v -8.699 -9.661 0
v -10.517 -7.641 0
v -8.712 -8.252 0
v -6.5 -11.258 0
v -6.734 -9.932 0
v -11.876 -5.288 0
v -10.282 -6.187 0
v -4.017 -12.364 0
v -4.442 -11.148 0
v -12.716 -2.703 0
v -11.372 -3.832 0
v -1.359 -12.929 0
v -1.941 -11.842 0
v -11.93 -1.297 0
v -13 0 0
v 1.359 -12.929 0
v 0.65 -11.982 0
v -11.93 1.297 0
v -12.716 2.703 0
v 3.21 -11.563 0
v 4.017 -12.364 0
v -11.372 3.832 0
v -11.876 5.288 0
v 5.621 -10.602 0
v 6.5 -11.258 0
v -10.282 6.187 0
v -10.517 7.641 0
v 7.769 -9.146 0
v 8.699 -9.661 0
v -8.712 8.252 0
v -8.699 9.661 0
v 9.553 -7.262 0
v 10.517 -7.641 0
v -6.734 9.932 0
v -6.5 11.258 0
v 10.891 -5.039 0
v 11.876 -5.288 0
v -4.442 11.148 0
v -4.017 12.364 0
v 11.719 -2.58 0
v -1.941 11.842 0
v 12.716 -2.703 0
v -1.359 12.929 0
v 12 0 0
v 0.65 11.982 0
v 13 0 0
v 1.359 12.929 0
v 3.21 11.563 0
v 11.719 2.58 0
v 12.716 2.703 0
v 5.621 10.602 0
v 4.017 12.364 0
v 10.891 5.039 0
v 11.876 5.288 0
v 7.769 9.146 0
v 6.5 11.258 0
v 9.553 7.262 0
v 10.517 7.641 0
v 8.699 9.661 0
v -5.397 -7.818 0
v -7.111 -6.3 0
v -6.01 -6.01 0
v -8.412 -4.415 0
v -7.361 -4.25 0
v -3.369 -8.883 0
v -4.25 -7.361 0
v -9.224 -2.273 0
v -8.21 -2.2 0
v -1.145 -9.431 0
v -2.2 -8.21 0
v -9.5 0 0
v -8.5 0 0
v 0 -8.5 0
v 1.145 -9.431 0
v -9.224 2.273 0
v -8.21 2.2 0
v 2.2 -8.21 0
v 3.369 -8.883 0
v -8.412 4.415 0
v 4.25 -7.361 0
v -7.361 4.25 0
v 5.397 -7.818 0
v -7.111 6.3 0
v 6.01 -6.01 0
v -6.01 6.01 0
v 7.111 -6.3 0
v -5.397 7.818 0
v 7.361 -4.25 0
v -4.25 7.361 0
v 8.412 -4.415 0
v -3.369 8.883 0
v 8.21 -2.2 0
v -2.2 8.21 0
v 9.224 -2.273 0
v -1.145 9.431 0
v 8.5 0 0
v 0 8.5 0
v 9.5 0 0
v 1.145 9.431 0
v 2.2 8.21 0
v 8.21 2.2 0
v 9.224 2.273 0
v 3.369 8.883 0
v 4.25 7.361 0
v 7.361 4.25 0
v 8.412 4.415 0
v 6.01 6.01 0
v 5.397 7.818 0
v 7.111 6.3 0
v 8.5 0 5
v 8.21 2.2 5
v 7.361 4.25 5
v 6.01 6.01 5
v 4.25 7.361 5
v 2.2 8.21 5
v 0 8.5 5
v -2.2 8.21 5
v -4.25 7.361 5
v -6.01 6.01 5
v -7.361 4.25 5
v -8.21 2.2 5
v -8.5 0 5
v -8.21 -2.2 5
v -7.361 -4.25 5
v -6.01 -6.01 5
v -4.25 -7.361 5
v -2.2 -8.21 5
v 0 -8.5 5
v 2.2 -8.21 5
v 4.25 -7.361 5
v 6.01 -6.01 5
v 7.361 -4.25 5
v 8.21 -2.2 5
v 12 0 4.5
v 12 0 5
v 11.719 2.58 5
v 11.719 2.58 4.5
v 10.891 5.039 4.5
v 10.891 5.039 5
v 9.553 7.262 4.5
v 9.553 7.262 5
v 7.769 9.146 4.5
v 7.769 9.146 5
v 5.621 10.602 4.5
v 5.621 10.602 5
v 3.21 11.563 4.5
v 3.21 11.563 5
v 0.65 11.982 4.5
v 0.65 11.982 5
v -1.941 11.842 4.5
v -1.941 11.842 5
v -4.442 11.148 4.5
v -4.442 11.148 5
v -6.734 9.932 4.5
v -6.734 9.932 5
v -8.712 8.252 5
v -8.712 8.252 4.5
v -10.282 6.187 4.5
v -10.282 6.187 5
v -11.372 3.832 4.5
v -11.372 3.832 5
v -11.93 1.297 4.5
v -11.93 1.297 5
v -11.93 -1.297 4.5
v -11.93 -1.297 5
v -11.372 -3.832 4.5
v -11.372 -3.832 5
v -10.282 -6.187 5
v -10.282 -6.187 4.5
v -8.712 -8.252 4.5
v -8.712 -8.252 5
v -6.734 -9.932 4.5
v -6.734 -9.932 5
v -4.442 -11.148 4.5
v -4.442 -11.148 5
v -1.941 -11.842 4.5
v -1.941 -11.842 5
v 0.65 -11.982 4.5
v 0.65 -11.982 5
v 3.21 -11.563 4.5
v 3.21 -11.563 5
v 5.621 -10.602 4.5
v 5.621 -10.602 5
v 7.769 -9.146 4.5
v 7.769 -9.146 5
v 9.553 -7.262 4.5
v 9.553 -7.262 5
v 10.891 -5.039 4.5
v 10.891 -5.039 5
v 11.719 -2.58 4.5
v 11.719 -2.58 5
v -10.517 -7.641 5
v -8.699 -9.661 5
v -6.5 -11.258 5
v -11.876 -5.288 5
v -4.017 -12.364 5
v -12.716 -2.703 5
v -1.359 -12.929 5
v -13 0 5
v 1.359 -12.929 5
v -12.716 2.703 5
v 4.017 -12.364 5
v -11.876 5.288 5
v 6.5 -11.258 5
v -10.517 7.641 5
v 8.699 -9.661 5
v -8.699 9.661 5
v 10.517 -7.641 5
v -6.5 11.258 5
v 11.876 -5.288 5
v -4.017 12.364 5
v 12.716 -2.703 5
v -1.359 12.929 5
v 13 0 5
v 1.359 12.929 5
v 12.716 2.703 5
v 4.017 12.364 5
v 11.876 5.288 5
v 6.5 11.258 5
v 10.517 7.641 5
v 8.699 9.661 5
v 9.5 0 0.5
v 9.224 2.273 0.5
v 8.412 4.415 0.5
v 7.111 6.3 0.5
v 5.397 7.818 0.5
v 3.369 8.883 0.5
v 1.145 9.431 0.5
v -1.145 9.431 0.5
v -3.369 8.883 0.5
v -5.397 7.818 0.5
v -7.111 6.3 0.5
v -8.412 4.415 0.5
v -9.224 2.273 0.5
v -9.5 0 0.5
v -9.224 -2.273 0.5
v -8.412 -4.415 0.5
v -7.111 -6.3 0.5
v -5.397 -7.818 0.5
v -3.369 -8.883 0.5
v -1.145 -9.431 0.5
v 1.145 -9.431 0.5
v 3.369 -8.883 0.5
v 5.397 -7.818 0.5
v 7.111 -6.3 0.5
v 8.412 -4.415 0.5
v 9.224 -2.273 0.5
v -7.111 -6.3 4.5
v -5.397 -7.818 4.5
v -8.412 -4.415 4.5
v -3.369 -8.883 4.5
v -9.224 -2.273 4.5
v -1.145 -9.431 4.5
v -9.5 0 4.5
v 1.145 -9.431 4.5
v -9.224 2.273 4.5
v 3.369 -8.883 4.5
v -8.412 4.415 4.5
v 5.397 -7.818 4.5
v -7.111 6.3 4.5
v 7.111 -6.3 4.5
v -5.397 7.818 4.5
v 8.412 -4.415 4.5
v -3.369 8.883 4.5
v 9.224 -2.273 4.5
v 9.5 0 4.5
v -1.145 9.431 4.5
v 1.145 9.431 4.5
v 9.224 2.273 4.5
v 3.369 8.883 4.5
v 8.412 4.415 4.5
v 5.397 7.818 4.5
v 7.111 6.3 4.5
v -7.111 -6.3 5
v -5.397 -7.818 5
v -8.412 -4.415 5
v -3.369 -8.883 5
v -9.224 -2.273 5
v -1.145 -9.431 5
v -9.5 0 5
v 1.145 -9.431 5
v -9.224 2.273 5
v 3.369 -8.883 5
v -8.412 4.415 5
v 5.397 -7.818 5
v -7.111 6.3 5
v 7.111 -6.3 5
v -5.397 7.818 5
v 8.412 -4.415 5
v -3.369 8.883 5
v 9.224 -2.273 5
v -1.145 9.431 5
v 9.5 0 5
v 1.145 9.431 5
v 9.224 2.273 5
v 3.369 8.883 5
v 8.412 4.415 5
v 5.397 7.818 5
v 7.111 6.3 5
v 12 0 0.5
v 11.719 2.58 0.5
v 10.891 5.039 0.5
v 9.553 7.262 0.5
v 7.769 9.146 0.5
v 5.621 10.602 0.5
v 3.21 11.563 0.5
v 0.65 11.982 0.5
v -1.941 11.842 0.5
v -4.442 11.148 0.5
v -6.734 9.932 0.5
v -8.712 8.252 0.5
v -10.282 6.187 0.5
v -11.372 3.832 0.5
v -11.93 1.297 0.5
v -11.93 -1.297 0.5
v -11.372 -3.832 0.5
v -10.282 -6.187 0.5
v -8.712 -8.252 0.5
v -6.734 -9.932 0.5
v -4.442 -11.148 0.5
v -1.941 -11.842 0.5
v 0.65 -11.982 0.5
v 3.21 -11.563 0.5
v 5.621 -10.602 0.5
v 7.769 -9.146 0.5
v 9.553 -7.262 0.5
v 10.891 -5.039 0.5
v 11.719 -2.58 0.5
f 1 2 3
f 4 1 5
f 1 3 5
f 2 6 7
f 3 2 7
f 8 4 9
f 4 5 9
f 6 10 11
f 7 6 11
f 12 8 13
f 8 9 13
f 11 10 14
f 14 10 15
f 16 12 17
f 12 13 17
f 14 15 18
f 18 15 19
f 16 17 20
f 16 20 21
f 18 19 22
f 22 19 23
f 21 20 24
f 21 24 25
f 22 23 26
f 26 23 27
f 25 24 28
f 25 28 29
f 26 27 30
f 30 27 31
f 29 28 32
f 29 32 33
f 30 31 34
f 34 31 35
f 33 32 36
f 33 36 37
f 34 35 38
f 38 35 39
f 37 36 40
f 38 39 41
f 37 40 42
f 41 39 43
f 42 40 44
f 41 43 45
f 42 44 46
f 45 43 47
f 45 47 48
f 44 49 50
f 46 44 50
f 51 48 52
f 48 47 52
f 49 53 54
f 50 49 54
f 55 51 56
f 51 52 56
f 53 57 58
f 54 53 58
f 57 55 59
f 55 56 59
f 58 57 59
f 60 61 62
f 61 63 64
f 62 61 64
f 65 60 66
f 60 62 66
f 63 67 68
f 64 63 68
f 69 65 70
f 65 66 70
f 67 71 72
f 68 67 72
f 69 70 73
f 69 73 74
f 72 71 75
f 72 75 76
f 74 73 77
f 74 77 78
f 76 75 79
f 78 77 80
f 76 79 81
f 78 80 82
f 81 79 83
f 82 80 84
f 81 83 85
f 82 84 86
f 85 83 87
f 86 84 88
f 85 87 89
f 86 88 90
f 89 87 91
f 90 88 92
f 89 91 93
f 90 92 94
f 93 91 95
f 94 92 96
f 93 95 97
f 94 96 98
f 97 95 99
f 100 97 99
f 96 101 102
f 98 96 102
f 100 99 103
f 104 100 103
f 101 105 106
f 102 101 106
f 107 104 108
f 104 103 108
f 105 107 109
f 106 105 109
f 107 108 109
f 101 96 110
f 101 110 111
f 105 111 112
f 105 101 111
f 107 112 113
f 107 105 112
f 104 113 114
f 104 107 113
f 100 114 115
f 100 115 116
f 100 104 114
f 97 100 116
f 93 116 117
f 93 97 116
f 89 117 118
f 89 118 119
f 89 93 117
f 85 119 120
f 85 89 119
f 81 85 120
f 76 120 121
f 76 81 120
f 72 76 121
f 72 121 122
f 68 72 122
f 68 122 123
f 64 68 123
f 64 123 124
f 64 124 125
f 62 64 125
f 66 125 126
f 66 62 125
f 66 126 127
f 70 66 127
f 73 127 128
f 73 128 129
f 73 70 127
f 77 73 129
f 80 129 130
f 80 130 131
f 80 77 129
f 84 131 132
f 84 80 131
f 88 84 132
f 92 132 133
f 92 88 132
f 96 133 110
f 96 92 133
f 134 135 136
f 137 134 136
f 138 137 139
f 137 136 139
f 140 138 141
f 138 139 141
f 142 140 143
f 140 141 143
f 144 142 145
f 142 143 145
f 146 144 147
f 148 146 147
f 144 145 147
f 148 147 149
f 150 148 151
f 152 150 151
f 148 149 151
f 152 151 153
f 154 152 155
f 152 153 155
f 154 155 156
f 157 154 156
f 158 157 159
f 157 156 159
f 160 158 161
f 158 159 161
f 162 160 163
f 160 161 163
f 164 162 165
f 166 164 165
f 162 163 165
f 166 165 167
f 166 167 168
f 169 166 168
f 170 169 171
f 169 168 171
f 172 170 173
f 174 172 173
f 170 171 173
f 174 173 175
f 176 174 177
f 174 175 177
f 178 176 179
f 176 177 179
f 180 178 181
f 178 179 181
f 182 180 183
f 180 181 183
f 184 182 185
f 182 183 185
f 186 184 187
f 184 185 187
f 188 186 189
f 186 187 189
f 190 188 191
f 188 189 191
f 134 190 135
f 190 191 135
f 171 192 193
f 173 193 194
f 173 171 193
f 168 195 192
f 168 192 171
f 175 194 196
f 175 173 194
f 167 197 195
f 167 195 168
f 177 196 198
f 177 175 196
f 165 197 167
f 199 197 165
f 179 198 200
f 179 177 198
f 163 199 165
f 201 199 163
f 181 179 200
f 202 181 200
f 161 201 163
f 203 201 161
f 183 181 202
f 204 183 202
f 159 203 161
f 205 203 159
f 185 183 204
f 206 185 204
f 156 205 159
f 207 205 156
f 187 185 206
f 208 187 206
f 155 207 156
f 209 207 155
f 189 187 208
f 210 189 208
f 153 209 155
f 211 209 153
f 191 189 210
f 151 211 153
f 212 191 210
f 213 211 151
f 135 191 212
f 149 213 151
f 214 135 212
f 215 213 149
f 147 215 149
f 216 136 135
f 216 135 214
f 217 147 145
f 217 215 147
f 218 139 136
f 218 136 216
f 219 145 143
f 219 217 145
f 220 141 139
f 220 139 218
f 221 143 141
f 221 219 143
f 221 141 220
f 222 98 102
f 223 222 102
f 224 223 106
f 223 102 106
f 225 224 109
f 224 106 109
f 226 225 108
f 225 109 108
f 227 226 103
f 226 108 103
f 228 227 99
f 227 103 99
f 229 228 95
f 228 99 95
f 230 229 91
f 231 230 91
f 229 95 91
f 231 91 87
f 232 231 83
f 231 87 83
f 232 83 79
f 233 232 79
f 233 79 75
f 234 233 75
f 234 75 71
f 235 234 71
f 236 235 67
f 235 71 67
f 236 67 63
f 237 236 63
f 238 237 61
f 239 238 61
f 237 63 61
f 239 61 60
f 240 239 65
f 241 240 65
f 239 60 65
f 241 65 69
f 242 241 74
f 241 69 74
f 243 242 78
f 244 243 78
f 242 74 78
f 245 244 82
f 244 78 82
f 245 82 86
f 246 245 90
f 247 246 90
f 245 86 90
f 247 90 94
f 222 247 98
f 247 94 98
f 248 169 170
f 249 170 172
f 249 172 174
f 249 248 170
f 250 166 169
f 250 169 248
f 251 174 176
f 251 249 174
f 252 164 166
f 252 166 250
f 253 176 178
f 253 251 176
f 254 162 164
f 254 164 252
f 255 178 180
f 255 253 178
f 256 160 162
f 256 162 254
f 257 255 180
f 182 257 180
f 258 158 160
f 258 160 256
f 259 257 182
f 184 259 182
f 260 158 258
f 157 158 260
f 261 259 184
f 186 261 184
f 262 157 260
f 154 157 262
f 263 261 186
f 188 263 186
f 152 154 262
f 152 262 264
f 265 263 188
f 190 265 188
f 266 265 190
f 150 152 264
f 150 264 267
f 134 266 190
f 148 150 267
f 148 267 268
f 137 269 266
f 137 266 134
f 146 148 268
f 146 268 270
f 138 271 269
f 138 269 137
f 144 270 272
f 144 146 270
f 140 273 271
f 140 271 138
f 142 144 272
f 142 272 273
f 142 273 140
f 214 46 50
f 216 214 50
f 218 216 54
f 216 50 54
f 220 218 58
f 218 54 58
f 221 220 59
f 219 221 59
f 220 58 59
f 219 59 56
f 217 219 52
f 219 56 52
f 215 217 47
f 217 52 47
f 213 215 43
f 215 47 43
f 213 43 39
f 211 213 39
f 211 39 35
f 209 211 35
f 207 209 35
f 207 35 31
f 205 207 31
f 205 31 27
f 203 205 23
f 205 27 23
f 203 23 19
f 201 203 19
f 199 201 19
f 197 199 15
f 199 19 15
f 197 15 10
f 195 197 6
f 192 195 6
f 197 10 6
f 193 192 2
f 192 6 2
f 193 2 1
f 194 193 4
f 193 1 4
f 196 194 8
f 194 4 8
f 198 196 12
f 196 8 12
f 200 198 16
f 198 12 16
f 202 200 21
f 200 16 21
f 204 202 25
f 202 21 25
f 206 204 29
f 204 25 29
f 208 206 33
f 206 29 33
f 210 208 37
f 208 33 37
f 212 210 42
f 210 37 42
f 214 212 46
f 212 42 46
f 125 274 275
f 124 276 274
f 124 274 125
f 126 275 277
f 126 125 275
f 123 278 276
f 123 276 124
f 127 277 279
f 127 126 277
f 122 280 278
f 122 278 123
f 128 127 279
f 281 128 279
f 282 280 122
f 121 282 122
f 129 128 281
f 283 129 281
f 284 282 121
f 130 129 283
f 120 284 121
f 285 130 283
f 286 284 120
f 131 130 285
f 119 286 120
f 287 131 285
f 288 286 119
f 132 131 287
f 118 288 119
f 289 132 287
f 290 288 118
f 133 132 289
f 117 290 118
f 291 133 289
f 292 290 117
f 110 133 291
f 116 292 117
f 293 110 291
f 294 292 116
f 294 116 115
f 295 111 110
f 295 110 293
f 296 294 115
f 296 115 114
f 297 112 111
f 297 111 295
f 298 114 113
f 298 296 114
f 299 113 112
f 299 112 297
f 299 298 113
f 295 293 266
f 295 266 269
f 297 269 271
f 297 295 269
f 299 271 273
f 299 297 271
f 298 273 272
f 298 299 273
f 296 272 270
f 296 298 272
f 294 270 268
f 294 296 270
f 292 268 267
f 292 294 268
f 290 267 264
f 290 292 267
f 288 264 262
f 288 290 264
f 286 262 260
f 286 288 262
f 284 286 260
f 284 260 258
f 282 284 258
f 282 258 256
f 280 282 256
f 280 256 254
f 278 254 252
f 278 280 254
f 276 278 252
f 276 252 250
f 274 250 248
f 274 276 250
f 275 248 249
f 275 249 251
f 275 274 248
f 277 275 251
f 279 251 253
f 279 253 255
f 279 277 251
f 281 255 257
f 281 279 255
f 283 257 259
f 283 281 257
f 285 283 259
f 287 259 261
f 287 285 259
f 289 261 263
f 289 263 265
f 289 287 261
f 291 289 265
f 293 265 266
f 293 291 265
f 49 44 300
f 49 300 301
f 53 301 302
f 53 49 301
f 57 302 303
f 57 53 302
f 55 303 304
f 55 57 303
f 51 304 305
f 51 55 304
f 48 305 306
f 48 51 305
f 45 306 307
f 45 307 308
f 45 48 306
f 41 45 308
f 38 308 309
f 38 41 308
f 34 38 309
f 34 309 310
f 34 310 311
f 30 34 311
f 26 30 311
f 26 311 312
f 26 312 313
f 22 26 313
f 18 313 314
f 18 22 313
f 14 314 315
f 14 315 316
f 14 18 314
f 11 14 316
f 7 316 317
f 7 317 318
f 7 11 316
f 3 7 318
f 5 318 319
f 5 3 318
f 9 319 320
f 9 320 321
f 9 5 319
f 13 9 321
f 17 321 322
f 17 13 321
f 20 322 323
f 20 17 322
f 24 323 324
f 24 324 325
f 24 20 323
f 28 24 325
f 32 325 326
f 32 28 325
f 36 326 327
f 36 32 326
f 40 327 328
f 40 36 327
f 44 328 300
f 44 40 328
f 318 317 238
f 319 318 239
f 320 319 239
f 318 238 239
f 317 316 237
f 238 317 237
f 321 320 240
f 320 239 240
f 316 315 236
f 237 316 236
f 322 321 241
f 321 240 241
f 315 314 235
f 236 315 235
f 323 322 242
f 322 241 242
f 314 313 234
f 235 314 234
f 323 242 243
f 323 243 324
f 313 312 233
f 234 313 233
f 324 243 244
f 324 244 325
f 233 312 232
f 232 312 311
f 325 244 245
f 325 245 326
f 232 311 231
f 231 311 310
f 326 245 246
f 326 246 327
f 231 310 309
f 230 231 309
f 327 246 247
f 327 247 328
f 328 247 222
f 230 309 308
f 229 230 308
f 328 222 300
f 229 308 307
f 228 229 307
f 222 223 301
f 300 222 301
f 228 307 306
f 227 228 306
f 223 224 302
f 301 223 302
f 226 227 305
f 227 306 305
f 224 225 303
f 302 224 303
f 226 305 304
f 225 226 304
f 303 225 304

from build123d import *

# Parameters (mm, degrees)
SKETCH013_R     = 13
SKETCH013_R_2   = 8.5
PAD008_DEPTH    = 5
SKETCH014_R     = 12
SKETCH014_R_2   = 9.5
POCKET006_DEPTH = 0.5
SKETCH015_R     = 12
SKETCH015_R_2   = 9.5
POCKET007_DEPTH = 0.5


with BuildPart() as part:
    # Sketch013 → Pad008 (new body)
    with BuildSketch(Plane.XY):
        Circle(SKETCH013_R)
        Circle(SKETCH013_R_2, mode=Mode.SUBTRACT)
    extrude(amount=PAD008_DEPTH)

    # Sketch014 → Pocket006 (cut)
    with BuildSketch(Plane.XY.offset(5)):
        Circle(SKETCH014_R)
        Circle(SKETCH014_R_2, mode=Mode.SUBTRACT)
    extrude(amount=-POCKET006_DEPTH, mode=Mode.SUBTRACT)

    # Sketch015 → Pocket007 (cut)
    with BuildSketch(Plane.XY):
        Circle(SKETCH015_R)
        Circle(SKETCH015_R_2, mode=Mode.SUBTRACT)
    extrude(amount=POCKET007_DEPTH, mode=Mode.SUBTRACT)


solid = part.part
